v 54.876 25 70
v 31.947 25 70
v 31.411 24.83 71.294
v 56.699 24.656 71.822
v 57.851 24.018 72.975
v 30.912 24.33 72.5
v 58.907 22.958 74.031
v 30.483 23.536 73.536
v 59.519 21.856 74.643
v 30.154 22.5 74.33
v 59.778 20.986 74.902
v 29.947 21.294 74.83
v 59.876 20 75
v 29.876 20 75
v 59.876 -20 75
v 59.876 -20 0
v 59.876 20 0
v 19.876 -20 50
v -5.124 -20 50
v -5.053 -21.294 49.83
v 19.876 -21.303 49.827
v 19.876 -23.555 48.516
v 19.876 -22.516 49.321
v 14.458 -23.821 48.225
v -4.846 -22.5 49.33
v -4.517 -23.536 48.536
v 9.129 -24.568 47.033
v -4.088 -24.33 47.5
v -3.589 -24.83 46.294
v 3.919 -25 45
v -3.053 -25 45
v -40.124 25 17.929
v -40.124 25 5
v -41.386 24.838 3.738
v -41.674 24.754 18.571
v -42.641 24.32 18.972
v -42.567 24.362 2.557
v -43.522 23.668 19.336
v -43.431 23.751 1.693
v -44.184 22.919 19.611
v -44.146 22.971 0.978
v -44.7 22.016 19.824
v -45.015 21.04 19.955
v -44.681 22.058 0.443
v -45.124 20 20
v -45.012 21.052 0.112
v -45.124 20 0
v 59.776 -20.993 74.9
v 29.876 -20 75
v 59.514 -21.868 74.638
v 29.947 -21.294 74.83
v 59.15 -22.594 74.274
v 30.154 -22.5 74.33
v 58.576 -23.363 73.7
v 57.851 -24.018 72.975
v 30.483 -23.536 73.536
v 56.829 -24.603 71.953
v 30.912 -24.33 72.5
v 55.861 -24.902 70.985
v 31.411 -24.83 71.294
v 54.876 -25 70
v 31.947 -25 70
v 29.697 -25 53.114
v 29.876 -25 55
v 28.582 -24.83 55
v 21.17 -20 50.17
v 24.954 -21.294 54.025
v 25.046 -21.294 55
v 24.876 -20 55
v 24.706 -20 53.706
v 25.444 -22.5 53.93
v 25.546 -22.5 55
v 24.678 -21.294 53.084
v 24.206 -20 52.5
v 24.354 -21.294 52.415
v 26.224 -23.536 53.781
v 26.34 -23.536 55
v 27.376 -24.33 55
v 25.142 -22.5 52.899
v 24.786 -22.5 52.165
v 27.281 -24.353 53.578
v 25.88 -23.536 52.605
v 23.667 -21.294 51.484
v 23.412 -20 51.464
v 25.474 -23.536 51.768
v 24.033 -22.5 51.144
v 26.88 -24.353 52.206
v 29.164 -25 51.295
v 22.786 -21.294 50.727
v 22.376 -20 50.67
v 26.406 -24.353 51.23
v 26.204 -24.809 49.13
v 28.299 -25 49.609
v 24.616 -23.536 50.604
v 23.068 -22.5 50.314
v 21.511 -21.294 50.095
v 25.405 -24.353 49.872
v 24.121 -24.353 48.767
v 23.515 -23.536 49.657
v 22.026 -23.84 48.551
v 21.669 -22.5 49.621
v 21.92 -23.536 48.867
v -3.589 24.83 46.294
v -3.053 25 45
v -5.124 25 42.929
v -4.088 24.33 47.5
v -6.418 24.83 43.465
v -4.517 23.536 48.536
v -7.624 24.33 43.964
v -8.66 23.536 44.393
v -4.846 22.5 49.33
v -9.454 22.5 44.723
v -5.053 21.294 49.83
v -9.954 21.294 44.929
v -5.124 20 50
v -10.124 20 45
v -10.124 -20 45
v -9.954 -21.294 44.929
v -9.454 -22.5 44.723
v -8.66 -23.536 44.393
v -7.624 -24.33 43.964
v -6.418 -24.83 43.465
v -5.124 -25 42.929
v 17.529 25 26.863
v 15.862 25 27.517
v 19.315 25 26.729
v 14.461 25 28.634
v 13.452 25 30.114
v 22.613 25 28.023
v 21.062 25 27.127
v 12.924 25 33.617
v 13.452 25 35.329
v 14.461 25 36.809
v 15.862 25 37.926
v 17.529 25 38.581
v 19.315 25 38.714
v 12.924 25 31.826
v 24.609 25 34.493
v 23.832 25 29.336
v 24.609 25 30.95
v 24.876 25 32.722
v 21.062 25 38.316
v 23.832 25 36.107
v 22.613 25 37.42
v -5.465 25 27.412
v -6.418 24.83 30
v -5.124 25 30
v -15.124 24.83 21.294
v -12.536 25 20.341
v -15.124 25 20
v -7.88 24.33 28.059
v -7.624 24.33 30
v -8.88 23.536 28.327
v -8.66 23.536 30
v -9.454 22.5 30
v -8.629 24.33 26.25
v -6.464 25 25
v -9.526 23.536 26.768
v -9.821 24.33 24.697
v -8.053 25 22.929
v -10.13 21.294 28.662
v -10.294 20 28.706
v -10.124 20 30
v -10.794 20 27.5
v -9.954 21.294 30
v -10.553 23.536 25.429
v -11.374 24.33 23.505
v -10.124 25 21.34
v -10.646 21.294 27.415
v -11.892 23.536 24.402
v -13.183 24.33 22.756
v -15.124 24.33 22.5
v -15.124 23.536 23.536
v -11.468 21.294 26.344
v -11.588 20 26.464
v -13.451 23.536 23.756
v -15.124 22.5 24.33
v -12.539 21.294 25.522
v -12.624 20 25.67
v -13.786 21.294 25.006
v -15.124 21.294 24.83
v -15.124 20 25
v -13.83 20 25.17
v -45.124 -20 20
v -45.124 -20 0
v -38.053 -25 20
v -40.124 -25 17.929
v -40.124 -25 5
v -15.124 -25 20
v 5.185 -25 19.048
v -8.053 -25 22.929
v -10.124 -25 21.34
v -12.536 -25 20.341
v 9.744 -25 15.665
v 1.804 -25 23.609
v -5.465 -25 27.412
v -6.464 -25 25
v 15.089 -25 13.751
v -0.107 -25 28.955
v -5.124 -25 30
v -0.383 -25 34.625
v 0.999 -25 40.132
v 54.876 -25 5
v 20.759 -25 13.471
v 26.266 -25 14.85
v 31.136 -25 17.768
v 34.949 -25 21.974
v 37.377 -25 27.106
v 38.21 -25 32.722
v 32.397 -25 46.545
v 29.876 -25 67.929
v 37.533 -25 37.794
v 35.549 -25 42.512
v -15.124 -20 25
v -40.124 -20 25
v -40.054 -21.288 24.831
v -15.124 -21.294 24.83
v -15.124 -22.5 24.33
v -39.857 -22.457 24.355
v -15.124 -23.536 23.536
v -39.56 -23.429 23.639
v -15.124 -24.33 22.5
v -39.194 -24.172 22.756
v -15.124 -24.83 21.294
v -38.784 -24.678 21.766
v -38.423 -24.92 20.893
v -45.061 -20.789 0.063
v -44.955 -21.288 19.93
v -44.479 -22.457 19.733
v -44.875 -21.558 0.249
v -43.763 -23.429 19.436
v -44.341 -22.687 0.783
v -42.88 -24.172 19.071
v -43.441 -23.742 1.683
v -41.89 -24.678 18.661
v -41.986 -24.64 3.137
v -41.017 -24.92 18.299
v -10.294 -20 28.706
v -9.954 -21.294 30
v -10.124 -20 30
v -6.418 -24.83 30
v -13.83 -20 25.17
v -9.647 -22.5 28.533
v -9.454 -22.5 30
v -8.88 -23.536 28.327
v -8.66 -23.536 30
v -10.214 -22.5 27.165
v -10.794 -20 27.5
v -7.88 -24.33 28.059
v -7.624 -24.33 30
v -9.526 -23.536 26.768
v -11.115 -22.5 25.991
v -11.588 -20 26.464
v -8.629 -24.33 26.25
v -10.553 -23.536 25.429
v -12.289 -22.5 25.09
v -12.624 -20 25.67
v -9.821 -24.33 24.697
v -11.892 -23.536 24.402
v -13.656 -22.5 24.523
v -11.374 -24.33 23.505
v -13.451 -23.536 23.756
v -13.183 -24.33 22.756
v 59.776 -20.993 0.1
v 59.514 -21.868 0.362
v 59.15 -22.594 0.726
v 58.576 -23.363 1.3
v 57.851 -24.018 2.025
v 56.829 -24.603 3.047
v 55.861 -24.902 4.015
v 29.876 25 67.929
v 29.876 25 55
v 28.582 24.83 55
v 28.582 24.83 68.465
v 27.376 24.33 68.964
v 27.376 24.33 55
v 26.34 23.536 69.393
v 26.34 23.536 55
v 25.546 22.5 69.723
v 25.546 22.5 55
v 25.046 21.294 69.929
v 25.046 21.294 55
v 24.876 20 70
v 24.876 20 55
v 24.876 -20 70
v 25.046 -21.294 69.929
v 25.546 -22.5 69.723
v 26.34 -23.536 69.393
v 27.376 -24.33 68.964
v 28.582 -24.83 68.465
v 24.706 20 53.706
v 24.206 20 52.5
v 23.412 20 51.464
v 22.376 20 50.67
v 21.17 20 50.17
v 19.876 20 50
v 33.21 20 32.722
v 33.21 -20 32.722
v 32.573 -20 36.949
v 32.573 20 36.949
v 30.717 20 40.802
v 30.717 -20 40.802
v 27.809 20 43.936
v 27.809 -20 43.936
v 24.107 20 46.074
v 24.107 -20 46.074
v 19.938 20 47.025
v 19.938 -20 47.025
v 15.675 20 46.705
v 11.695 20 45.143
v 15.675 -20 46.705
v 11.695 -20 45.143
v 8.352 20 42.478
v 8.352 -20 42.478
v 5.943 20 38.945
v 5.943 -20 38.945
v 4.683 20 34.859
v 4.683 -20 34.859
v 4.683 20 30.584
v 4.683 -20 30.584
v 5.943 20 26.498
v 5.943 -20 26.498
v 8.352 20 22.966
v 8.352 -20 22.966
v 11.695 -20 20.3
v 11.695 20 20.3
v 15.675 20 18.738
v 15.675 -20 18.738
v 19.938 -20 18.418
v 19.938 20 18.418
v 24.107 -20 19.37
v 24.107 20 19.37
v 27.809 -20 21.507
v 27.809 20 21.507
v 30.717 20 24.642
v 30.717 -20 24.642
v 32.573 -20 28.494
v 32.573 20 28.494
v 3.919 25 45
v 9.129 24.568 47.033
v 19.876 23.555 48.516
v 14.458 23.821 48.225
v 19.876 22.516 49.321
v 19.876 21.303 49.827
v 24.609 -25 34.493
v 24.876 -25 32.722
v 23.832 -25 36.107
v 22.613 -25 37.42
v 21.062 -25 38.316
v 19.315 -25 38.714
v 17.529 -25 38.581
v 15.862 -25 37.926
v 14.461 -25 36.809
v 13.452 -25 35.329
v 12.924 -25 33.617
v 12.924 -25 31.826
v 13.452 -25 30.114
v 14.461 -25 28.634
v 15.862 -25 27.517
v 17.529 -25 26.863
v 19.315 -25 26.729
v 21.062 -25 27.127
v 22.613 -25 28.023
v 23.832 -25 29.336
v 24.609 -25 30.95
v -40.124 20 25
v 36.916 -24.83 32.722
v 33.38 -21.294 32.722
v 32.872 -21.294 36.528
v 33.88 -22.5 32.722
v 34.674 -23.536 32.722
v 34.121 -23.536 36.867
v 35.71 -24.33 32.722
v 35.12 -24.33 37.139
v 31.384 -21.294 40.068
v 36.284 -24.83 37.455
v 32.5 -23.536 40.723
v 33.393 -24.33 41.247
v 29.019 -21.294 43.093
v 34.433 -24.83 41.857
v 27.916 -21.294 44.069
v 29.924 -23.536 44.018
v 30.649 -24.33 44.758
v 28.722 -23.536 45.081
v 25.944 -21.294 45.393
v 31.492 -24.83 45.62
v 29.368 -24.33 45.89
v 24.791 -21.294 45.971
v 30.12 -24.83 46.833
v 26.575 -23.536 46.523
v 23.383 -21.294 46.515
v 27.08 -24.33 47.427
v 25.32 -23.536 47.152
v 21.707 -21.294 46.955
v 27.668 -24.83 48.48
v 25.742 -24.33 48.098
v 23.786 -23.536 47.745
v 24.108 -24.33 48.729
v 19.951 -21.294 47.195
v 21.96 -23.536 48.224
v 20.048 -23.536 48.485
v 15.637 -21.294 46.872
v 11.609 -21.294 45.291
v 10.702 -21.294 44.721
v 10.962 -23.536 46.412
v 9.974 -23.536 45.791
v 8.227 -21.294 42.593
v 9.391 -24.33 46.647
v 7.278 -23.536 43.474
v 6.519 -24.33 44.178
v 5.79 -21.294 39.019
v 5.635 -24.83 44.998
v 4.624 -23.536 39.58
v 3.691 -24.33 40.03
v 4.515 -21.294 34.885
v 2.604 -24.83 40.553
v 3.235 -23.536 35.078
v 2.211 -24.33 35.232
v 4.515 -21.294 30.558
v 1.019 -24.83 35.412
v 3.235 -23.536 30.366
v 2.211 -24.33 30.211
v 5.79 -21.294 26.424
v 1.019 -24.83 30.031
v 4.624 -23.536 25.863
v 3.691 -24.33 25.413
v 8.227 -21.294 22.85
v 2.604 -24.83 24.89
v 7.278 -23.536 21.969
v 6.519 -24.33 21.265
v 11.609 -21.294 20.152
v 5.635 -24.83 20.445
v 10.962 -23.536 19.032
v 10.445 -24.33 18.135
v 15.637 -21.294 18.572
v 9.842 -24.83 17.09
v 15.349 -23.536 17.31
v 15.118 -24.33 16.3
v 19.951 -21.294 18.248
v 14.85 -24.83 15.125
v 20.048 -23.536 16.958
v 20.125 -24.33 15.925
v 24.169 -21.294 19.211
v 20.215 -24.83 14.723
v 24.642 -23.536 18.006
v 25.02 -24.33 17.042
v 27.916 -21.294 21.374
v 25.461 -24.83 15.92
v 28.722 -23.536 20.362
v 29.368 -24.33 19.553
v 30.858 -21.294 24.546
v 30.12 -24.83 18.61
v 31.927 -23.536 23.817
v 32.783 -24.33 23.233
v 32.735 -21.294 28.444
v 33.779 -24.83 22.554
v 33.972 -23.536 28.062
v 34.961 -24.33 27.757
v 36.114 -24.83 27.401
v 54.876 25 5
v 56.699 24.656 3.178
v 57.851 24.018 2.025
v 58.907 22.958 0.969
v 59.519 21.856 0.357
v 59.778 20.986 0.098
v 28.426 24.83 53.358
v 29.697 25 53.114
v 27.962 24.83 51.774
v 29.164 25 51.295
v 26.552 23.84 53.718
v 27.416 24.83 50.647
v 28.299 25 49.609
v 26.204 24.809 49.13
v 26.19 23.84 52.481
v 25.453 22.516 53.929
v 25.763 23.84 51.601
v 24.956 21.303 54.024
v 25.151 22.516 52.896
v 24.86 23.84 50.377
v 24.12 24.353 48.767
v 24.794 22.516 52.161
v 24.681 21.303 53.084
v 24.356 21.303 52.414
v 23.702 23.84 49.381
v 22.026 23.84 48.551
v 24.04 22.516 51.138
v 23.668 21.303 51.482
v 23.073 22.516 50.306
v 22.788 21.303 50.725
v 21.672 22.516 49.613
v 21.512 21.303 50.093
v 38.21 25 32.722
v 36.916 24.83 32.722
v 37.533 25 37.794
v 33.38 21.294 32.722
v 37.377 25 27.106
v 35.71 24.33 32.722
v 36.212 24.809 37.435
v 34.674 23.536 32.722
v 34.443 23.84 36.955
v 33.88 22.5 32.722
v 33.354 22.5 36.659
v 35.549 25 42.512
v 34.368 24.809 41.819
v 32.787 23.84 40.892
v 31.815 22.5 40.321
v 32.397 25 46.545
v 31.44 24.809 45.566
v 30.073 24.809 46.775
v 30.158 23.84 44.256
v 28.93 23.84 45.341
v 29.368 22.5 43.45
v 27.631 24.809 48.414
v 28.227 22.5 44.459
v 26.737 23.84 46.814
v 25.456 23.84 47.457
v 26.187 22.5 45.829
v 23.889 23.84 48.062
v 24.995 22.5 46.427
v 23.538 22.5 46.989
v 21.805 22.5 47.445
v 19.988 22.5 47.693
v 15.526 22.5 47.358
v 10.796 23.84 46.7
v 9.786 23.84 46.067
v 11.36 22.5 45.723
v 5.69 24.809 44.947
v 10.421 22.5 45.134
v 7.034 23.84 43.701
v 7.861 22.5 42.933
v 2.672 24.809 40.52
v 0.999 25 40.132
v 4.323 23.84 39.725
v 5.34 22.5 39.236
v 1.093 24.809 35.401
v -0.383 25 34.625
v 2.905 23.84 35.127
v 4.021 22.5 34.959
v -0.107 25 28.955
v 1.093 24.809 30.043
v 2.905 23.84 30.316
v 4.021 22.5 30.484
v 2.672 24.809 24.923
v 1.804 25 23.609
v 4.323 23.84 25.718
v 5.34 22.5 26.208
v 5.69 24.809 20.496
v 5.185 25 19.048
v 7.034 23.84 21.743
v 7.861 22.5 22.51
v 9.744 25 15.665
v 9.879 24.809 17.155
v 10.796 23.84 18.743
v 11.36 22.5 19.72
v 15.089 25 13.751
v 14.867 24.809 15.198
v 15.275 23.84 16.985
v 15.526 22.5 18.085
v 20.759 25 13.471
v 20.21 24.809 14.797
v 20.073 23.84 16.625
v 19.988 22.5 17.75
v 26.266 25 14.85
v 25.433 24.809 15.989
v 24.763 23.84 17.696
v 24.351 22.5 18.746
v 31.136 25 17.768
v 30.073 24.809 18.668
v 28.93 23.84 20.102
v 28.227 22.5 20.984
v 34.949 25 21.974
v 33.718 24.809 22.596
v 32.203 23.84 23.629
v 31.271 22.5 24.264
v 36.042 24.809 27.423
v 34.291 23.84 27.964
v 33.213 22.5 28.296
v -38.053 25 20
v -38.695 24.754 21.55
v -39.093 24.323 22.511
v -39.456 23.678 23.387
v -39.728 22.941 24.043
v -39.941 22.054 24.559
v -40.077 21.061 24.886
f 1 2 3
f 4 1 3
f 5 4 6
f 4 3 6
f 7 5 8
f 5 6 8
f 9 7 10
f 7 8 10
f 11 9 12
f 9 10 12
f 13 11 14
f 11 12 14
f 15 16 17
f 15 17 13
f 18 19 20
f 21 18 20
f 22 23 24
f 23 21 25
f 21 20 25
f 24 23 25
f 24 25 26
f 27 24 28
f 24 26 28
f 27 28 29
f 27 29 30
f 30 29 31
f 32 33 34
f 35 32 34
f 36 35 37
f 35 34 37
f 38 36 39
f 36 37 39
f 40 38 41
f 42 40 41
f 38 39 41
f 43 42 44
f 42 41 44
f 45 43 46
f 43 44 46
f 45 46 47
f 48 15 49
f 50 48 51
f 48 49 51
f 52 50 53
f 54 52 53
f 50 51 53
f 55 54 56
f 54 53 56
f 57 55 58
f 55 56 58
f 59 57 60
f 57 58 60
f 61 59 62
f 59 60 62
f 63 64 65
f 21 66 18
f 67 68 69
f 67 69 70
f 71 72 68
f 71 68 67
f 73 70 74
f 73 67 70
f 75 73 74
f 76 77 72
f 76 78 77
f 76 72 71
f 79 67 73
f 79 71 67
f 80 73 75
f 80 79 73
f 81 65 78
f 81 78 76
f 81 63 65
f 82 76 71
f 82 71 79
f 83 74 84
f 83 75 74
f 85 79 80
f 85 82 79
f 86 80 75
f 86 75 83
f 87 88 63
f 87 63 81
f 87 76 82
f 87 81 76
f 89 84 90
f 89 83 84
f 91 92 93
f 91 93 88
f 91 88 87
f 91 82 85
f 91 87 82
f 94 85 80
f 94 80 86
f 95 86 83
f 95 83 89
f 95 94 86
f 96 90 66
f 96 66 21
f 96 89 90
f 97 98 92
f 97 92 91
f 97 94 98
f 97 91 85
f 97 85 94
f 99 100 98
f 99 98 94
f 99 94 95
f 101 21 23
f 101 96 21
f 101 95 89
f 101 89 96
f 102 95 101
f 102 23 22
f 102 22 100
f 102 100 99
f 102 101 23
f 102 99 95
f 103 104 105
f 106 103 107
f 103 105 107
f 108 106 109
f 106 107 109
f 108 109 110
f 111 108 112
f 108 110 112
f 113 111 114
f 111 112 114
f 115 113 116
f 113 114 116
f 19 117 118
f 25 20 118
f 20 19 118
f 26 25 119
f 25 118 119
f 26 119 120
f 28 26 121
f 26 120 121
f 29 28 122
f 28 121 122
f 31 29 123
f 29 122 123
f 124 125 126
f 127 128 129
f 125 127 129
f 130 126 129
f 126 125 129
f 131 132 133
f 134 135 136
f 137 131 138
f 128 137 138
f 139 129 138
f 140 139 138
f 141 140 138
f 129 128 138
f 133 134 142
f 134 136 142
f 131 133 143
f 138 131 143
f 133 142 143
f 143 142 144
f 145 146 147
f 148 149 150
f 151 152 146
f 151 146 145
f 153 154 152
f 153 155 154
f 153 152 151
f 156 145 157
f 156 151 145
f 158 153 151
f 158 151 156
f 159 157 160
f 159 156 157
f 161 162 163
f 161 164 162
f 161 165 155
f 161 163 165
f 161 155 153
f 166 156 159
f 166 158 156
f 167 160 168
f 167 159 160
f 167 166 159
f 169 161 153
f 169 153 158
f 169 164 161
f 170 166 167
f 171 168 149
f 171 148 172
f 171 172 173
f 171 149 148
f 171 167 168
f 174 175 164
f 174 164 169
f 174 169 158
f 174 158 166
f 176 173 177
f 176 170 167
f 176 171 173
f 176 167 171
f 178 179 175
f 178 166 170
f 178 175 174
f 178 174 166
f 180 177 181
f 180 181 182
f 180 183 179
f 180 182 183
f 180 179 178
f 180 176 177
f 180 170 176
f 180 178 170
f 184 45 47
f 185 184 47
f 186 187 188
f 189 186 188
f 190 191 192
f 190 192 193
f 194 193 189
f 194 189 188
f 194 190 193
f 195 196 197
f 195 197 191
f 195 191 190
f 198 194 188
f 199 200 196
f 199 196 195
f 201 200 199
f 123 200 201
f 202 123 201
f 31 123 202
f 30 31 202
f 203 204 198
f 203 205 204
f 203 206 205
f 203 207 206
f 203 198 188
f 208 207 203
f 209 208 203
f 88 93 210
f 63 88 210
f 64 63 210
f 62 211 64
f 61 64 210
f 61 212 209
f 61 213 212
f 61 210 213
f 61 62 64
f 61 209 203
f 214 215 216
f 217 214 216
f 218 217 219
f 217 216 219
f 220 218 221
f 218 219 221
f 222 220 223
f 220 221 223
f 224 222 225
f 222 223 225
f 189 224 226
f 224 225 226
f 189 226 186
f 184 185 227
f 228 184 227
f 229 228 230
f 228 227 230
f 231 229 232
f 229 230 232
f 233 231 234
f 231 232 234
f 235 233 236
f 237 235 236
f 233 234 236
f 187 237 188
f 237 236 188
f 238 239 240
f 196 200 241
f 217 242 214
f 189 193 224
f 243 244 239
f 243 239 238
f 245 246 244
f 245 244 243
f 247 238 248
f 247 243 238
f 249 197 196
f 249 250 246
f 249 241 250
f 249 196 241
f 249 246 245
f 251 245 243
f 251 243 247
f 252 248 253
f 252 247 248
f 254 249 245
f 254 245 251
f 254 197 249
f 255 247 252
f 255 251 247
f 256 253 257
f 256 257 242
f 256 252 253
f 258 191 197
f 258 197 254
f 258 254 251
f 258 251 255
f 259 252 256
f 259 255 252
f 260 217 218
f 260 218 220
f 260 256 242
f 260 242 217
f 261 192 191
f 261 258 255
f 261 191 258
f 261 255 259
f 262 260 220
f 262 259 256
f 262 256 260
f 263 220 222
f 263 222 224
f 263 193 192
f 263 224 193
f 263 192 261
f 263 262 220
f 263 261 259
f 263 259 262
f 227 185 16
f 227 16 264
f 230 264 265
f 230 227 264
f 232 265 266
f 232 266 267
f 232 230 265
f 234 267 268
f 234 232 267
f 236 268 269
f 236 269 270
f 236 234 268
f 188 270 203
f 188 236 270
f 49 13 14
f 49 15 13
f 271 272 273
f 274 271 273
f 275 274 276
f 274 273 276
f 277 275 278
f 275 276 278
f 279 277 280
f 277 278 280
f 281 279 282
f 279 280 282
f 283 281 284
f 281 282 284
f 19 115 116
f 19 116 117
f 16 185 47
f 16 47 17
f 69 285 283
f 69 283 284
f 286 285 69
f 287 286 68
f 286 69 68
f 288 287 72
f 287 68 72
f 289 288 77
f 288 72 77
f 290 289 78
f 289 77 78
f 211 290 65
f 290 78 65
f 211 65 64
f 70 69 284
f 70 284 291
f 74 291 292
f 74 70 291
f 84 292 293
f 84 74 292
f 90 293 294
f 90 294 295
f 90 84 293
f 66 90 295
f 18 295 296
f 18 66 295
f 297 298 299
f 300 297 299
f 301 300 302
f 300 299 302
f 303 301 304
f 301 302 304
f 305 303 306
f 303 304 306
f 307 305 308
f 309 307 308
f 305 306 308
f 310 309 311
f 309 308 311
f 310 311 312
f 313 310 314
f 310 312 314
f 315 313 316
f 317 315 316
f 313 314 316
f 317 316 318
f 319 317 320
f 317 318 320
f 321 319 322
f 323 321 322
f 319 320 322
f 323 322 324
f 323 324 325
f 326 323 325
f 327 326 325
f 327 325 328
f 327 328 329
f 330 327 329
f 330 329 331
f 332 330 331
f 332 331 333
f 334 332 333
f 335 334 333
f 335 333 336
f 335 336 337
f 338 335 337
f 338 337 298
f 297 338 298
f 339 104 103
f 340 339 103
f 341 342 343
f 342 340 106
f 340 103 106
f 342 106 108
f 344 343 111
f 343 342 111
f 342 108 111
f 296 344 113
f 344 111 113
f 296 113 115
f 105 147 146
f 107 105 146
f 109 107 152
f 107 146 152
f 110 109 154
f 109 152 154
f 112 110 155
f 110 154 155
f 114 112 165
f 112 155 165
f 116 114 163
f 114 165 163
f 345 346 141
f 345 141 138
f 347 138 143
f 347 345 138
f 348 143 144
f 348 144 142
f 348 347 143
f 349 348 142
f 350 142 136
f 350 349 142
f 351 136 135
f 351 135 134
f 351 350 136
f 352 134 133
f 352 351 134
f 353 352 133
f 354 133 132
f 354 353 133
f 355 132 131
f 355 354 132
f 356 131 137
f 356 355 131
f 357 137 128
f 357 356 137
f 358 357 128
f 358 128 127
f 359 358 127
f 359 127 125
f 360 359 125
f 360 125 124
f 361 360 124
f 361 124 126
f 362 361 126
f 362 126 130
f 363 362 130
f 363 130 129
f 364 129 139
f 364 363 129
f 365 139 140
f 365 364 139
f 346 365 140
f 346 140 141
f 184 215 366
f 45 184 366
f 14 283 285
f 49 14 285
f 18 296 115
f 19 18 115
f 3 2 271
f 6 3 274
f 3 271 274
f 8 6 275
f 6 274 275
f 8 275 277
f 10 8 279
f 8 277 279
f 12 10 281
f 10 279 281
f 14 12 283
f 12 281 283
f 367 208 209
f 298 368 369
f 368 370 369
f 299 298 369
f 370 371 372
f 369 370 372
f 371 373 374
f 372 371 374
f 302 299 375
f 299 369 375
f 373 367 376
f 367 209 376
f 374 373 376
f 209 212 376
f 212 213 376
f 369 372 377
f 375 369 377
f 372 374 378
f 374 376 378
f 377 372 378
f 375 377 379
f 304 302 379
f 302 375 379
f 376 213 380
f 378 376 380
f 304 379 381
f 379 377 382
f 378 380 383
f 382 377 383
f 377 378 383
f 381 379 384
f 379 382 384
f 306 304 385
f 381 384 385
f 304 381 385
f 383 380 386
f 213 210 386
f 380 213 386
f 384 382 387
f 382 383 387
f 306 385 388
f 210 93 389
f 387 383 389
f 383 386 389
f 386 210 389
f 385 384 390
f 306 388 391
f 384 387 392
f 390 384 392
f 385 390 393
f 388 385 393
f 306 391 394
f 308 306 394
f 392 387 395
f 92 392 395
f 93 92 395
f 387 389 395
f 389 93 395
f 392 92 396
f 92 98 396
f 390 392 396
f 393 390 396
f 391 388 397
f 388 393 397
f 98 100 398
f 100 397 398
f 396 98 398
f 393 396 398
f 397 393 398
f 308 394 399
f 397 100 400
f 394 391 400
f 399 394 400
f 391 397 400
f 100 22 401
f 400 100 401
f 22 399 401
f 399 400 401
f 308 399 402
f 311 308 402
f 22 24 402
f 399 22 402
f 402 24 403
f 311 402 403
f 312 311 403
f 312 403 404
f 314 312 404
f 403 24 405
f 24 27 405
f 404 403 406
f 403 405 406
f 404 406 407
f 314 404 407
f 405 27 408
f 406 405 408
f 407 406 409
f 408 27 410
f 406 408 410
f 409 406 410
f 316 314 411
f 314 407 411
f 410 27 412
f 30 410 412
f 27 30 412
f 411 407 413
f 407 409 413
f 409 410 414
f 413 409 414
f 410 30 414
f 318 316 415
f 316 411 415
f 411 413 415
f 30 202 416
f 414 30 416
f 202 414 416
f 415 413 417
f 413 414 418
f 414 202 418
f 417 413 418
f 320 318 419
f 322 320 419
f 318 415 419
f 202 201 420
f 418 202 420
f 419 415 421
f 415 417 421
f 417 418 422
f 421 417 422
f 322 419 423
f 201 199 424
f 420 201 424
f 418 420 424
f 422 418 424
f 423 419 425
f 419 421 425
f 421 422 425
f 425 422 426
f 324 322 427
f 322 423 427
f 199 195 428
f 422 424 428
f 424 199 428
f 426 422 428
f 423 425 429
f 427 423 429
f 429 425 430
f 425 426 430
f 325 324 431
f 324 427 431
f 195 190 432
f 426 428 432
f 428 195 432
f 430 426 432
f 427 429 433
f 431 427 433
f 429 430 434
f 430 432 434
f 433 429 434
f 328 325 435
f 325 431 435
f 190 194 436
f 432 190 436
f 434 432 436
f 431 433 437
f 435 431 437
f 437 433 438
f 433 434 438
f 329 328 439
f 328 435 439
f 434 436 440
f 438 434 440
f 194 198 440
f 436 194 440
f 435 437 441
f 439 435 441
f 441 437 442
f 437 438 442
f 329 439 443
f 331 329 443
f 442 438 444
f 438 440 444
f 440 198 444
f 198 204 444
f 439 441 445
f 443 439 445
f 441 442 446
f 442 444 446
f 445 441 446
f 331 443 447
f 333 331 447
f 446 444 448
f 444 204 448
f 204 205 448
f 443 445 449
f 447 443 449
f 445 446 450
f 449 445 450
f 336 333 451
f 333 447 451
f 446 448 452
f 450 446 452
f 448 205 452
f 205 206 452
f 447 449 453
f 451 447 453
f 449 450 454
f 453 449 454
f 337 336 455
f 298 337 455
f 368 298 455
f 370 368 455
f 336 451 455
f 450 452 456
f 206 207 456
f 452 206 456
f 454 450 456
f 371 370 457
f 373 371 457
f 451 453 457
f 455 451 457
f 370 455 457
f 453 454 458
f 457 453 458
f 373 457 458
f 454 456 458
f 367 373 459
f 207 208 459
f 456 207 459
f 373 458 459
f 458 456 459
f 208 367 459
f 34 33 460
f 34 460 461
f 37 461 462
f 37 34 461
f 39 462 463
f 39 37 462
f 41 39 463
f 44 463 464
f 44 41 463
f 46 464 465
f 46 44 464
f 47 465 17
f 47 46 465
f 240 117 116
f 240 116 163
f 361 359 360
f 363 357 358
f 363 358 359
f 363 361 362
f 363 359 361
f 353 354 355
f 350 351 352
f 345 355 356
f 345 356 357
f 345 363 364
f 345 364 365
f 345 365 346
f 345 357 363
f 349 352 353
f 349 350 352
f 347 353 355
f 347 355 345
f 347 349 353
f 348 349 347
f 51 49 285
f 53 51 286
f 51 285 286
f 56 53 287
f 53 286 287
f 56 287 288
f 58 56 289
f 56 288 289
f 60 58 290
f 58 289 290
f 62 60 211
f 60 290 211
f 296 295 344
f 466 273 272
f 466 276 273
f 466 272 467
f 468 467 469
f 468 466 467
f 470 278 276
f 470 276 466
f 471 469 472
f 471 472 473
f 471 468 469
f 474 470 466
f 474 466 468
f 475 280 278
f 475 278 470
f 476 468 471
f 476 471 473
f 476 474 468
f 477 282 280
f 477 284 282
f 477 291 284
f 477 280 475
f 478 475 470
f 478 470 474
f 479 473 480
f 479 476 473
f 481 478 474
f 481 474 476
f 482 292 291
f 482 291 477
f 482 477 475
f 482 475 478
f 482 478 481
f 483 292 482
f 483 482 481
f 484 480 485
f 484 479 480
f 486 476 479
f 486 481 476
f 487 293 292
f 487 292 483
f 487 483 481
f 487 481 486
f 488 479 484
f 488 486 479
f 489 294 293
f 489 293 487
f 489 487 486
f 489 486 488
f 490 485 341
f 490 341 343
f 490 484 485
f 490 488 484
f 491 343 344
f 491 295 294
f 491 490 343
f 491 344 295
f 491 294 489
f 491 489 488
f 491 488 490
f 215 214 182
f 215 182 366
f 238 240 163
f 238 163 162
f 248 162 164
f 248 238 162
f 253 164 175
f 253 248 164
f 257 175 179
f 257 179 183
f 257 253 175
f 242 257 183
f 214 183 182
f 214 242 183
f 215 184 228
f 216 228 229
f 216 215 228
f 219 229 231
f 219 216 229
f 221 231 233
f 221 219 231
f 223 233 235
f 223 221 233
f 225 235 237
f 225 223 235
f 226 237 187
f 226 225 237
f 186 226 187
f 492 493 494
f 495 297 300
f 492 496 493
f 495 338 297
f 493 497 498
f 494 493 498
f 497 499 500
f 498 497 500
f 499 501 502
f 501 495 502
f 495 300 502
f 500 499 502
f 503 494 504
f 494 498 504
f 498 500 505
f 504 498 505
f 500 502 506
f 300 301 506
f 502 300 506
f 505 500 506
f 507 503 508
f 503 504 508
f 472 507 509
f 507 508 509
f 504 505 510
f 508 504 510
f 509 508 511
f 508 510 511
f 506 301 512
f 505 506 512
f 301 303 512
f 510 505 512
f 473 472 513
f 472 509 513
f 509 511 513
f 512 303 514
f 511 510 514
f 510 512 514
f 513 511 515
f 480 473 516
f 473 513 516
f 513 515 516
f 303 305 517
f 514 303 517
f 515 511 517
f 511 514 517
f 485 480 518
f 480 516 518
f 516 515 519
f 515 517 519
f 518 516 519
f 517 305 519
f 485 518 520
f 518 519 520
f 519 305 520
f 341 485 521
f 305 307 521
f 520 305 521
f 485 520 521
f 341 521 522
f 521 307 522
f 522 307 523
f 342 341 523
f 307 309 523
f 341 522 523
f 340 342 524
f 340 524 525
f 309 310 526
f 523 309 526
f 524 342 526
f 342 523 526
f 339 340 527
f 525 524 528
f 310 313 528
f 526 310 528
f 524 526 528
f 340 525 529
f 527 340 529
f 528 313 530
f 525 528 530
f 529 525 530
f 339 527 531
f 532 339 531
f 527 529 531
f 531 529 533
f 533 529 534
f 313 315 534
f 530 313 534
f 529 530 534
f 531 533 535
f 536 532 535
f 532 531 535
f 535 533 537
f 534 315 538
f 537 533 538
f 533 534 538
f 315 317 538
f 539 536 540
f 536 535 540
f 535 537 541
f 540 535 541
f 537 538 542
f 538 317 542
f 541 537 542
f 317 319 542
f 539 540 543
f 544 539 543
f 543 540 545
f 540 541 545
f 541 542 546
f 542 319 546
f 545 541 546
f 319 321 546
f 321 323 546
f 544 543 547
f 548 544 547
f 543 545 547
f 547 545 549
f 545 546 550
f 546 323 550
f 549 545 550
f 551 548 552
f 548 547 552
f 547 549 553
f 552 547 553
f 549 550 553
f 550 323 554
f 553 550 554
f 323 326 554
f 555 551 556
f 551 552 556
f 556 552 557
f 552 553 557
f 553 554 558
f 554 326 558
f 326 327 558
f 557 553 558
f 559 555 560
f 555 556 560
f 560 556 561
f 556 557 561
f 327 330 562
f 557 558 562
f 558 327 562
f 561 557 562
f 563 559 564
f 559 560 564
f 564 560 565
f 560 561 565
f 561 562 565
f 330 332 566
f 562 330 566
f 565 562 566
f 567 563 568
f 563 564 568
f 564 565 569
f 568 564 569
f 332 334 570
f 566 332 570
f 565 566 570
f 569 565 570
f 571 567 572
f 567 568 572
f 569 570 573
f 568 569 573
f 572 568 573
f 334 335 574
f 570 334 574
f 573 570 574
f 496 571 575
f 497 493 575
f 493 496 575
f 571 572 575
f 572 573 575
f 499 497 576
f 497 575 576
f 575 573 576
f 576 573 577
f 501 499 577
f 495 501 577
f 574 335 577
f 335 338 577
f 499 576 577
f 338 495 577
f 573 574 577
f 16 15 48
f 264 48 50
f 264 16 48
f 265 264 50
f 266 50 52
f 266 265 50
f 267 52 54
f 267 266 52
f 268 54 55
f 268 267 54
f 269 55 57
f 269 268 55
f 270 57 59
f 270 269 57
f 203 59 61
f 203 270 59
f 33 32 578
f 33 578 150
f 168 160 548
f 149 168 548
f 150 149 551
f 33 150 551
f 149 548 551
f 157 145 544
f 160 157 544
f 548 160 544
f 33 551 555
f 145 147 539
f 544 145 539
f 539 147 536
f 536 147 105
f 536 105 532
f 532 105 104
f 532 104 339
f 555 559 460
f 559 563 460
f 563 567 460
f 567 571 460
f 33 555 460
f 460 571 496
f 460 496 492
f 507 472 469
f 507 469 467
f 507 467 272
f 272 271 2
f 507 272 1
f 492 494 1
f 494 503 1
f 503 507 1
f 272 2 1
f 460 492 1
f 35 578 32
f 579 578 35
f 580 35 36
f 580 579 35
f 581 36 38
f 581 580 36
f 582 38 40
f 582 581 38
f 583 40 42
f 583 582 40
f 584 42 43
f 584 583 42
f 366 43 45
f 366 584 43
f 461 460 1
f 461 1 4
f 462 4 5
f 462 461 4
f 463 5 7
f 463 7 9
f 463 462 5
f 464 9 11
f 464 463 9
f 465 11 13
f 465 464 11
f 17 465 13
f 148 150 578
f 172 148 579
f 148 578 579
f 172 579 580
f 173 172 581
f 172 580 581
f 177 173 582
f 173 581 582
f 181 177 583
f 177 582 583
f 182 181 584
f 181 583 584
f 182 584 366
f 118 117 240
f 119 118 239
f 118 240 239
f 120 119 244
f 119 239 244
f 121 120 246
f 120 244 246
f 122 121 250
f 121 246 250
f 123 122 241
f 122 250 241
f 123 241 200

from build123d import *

# Parameters (mm, degrees)
F1_DEPTH     = 25
F2_R         = 14.3434394771
F2_R_2       = 6.0096705541
F3_DEPTH     = 50
F4_SIZE      = 5
F5_T1_DEPTH  = 55
F5_T3_DEPTH  = 32.0710678119
F5_T5_DEPTH  = 27.5
F5_T7_DEPTH  = 32.0710678119
F5_T9_DEPTH  = 27.5
F5_T11_DEPTH = 37.5
F5_T13_DEPTH = 37.5
F5_T15_DEPTH = 32.0710678119
F5_T17_DEPTH = 45
F5_T19_DEPTH = 130
F5_T21_DEPTH = 100
F5_T24_ANGLE = 90
F5_T26_ANGLE = 90
F5_T30_ANGLE = 90
F5_T32_ANGLE = 90


# Not quite as in the source:
# - a fillet or chamfer that OpenCascade refuses, or shapes differently, is made with other operations: its cross-section is extruded or revolved along the edge and cut away or added


with BuildPart() as f1:
    # F0 (on Front) → F1 (new body, symmetric)
    with BuildSketch(Plane.XZ):
        with BuildLine():
            Line((-45.1239673958, 25), (-45.1239673958, 0))
            Line((-45.1239673958, 0), (59.8760326042, 0))
            Line((59.8760326042, 0), (59.8760326042, 75))
            Line((59.8760326042, 75), (24.8760326042, 75))
            Line((24.8760326042, 75), (24.8760326042, 55))
            ThreePointArc((24.8760326042, 55), (23.4115665102, 51.4644660941), (19.8760326042, 50))
            Line((19.8760326042, 50), (-10.1239673958, 50))
            Line((-10.1239673958, 50), (-10.1239673958, 30))
            ThreePointArc((-10.1239673958, 30), (-11.5884334898, 26.4644660941), (-15.1239673958, 25))
            Line((-15.1239673958, 25), (-45.1239673958, 25))
        make_face()
    extrude(amount=F1_DEPTH, both=True)

    # F2 (on face) → F3 (cut, through all)
    with BuildSketch(Plane.XZ.offset(25)):
        with Locations((18.8663620502, 32.7215865254)):
            Circle(F2_R)
        with Locations((18.8663620502, 32.7215865254)):
            Circle(F2_R_2, mode=Mode.SUBTRACT)
    extrude(amount=-F3_DEPTH, mode=Mode.SUBTRACT)

    # F4
    f4_edges = [f1.edges().sort_by_distance(p)[0] for p in [
        (-45.123967, 0, 25),
        (-10.123967, 0, 50),
        (24.876033, 0, 75),
    ]]
    chamfer(f4_edges, length=F4_SIZE)

    # F5: fillet of radius 5 on 28 edges, made by hand

    # F5_s2 → F5_t1 (cut)
    with BuildSketch(Plane.YZ.offset(17.3760326042)):
        with BuildLine():
            ThreePointArc((-20, 75), (-23.5355339059, 73.5355339059), (-25, 70))
            Line((-25, 70), (-25, 75))
            Line((-25, 75), (-20, 75))
        make_face()
        with BuildLine():
            ThreePointArc((25, 70), (23.5355339059, 73.5355339059), (20, 75))
            Line((20, 75), (25, 75))
            Line((25, 75), (25, 70))
        make_face()
    extrude(amount=F5_T1_DEPTH, mode=Mode.SUBTRACT)

    # F5_s4 → F5_t3 (cut)
    with BuildSketch(Plane(origin=(38.5991815373, 0, 38.5991815373), x_dir=(0, 1, 0), z_dir=(0.7071067812, 0, 0.7071067812))):
        with BuildLine():
            ThreePointArc((-20, 31.9074633396), (-23.5355339059, 30.4429972455), (-25, 26.9074633396))
            Line((-25, 26.9074633396), (-25, 31.9074633396))
            Line((-25, 31.9074633396), (-20, 31.9074633396))
        make_face()
        with BuildLine():
            ThreePointArc((25, 26.9074633396), (23.5355339059, 30.4429972455), (20, 31.9074633396))
            Line((20, 31.9074633396), (25, 31.9074633396))
            Line((25, 31.9074633396), (25, 26.9074633396))
        make_face()
    extrude(amount=F5_T3_DEPTH, mode=Mode.SUBTRACT)

    # F5_s6 → F5_t5 (cut)
    with BuildSketch(Plane.XY.offset(55)):
        with BuildLine():
            ThreePointArc((24.8760326042, -20), (26.3404986983, -23.5355339059), (29.8760326042, -25))
            Line((29.8760326042, -25), (24.8760326042, -25))
            Line((24.8760326042, -25), (24.8760326042, -20))
        make_face()
        with BuildLine():
            ThreePointArc((29.8760326042, 25), (26.3404986983, 23.5355339059), (24.8760326042, 20))
            Line((24.8760326042, 20), (24.8760326042, 25))
            Line((24.8760326042, 25), (29.8760326042, 25))
        make_face()
    extrude(amount=F5_T5_DEPTH, mode=Mode.SUBTRACT)

    # F5_s8 → F5_t7 (cut)
    with BuildSketch(Plane(origin=(8.5991815373, 0, 8.5991815373), x_dir=(0, 1, 0), z_dir=(0.7071067812, 0, 0.7071067812))):
        with BuildLine():
            ThreePointArc((-20, 38.9785311515), (-23.5355339059, 37.5140650574), (-25, 33.9785311515))
            Line((-25, 33.9785311515), (-25, 38.9785311515))
            Line((-25, 38.9785311515), (-20, 38.9785311515))
        make_face()
        with BuildLine():
            ThreePointArc((25, 33.9785311515), (23.5355339059, 37.5140650574), (20, 38.9785311515))
            Line((20, 38.9785311515), (25, 38.9785311515))
            Line((25, 38.9785311515), (25, 33.9785311515))
        make_face()
    extrude(amount=F5_T7_DEPTH, mode=Mode.SUBTRACT)

    # F5_s10 → F5_t9 (cut)
    with BuildSketch(Plane.XY.offset(30)):
        with BuildLine():
            ThreePointArc((-10.1239673958, -20), (-8.6595013017, -23.5355339059), (-5.1239673958, -25))
            Line((-5.1239673958, -25), (-10.1239673958, -25))
            Line((-10.1239673958, -25), (-10.1239673958, -20))
        make_face()
        with BuildLine():
            ThreePointArc((-5.1239673958, 25), (-8.6595013017, 23.5355339059), (-10.1239673958, 20))
            Line((-10.1239673958, 20), (-10.1239673958, 25))
            Line((-10.1239673958, 25), (-5.1239673958, 25))
        make_face()
    extrude(amount=F5_T9_DEPTH, mode=Mode.SUBTRACT)

    # F5_s12 → F5_t11 (cut)
    with BuildSketch(Plane.YZ.offset(-17.6239673958)):
        with BuildLine():
            ThreePointArc((-20, 50), (-23.5355339059, 48.5355339059), (-25, 45))
            Line((-25, 45), (-25, 50))
            Line((-25, 50), (-20, 50))
        make_face()
        with BuildLine():
            ThreePointArc((25, 45), (23.5355339059, 48.5355339059), (20, 50))
            Line((20, 50), (25, 50))
            Line((25, 50), (25, 45))
        make_face()
    extrude(amount=F5_T11_DEPTH, mode=Mode.SUBTRACT)

    # F5_s14 → F5_t13 (cut)
    with BuildSketch(Plane.YZ.offset(-52.6239673958)):
        with BuildLine():
            ThreePointArc((-20, 25), (-23.5355339059, 23.5355339059), (-25, 20))
            Line((-25, 20), (-25, 25))
            Line((-25, 25), (-20, 25))
        make_face()
        with BuildLine():
            ThreePointArc((25, 20), (23.5355339059, 23.5355339059), (20, 25))
            Line((20, 25), (25, 25))
            Line((25, 25), (25, 20))
        make_face()
    extrude(amount=F5_T13_DEPTH, mode=Mode.SUBTRACT)

    # F5_s16 → F5_t15 (cut)
    with BuildSketch(Plane(origin=(1.2768510669, 0, 1.2768510669), x_dir=(0, 1, 0), z_dir=(-0.7071067812, 0, -0.7071067812))):
        with BuildLine():
            ThreePointArc((-20, -46.0495989633), (-23.5355339059, -44.5851328693), (-25, -41.0495989633))
            Line((-25, -41.0495989633), (-25, -46.0495989633))
            Line((-25, -46.0495989633), (-20, -46.0495989633))
        make_face()
        with BuildLine():
            ThreePointArc((25, -41.0495989633), (23.5355339059, -44.5851328693), (20, -46.0495989633))
            Line((20, -46.0495989633), (25, -46.0495989633))
            Line((25, -46.0495989633), (25, -41.0495989633))
        make_face()
    extrude(amount=F5_T15_DEPTH, mode=Mode.SUBTRACT)

    # F5_s18 → F5_t17 (cut)
    with BuildSketch(Plane.XY.offset(-12.5)):
        with BuildLine():
            ThreePointArc((-45.1239673958, -20), (-43.6595013017, -23.5355339059), (-40.1239673958, -25))
            Line((-40.1239673958, -25), (-45.1239673958, -25))
            Line((-45.1239673958, -25), (-45.1239673958, -20))
        make_face()
        with BuildLine():
            ThreePointArc((-40.1239673958, 25), (-43.6595013017, 23.5355339059), (-45.1239673958, 20))
            Line((-45.1239673958, 20), (-45.1239673958, 25))
            Line((-45.1239673958, 25), (-40.1239673958, 25))
        make_face()
    extrude(amount=F5_T17_DEPTH, mode=Mode.SUBTRACT)

    # F5_s20 → F5_t19 (cut)
    with BuildSketch(Plane.YZ.offset(-57.6239673958)):
        with BuildLine():
            ThreePointArc((-20, 0), (-23.5355339059, 1.4644660941), (-25, 5))
            Line((-25, 5), (-25, 0))
            Line((-25, 0), (-20, 0))
        make_face()
        with BuildLine():
            ThreePointArc((25, 5), (23.5355339059, 1.4644660941), (20, 0))
            Line((20, 0), (25, 0))
            Line((25, 0), (25, 5))
        make_face()
    extrude(amount=F5_T19_DEPTH, mode=Mode.SUBTRACT)

    # F5_s22 → F5_t21 (cut)
    with BuildSketch(Plane.XY.offset(-12.5)):
        with BuildLine():
            ThreePointArc((59.8760326042, -20), (58.4115665102, -23.5355339059), (54.8760326042, -25))
            Line((54.8760326042, -25), (59.8760326042, -25))
            Line((59.8760326042, -25), (59.8760326042, -20))
        make_face()
        with BuildLine():
            ThreePointArc((54.8760326042, 25), (58.4115665102, 23.5355339059), (59.8760326042, 20))
            Line((59.8760326042, 20), (59.8760326042, 25))
            Line((59.8760326042, 25), (54.8760326042, 25))
        make_face()
    extrude(amount=F5_T21_DEPTH, mode=Mode.SUBTRACT)

    # F5_s23 → F5_t24 (revolve, cut)
    with BuildSketch(Plane.XY.offset(55)):
        with BuildLine():
            ThreePointArc((24.8760326042, -20), (26.3404986983, -23.5355339059), (29.8760326042, -25))
            Line((29.8760326042, -25), (24.8760326042, -25))
            Line((24.8760326042, -25), (24.8760326042, -20))
        make_face()
    revolve(axis=Axis((19.8760326042, -25, 55), (0, 1, 0)), revolution_arc=F5_T24_ANGLE, mode=Mode.SUBTRACT)

    # F5_s25 → F5_t26 (revolve, cut)
    with BuildSketch(Plane.XY.offset(30)):
        with BuildLine():
            ThreePointArc((-10.1239673958, -20), (-8.6595013017, -23.5355339059), (-5.1239673958, -25))
            Line((-5.1239673958, -25), (-10.1239673958, -25))
            Line((-10.1239673958, -25), (-10.1239673958, -20))
        make_face()
    revolve(axis=Axis((-15.1239673958, -25, 30), (0, 1, 0)), revolution_arc=F5_T26_ANGLE, mode=Mode.SUBTRACT)

    # F5_s27 → F5_t28 (revolve, cut)
    with BuildSketch(Plane.XY.offset(32.7215865254)):
        with BuildLine():
            ThreePointArc((33.2098015273, -20), (34.6742676213, -23.5355339059), (38.2098015273, -25))
            Line((38.2098015273, -25), (33.2098015273, -25))
            Line((33.2098015273, -25), (33.2098015273, -20))
        make_face()
    revolve(axis=Axis((18.8663620502, -25, 32.7215865254), (0, -1, 0)), mode=Mode.SUBTRACT)

    # F5_s29 → F5_t30 (revolve, cut)
    with BuildSketch(Plane.XY.offset(30)):
        with BuildLine():
            ThreePointArc((-5.1239673958, 25), (-8.6595013017, 23.5355339059), (-10.1239673958, 20))
            Line((-10.1239673958, 20), (-10.1239673958, 25))
            Line((-10.1239673958, 25), (-5.1239673958, 25))
        make_face()
    revolve(axis=Axis((-15.1239673958, 25, 30), (0, 1, 0)), revolution_arc=F5_T30_ANGLE, mode=Mode.SUBTRACT)

    # F5_s31 → F5_t32 (revolve, cut)
    with BuildSketch(Plane.XY.offset(55)):
        with BuildLine():
            ThreePointArc((29.8760326042, 25), (26.3404986983, 23.5355339059), (24.8760326042, 20))
            Line((24.8760326042, 20), (24.8760326042, 25))
            Line((24.8760326042, 25), (29.8760326042, 25))
        make_face()
    revolve(axis=Axis((19.8760326042, 25, 55), (0, 1, 0)), revolution_arc=F5_T32_ANGLE, mode=Mode.SUBTRACT)

    # F5_s33 → F5_t34 (revolve, cut)
    with BuildSketch(Plane.XY.offset(32.7215865254)):
        with BuildLine():
            ThreePointArc((38.2098015273, 25), (34.6742676213, 23.5355339059), (33.2098015273, 20))
            Line((33.2098015273, 20), (33.2098015273, 25))
            Line((33.2098015273, 25), (38.2098015273, 25))
        make_face()
    revolve(axis=Axis((18.8663620502, 25, 32.7215865254), (0, -1, 0)), mode=Mode.SUBTRACT)


solid = f1.part
